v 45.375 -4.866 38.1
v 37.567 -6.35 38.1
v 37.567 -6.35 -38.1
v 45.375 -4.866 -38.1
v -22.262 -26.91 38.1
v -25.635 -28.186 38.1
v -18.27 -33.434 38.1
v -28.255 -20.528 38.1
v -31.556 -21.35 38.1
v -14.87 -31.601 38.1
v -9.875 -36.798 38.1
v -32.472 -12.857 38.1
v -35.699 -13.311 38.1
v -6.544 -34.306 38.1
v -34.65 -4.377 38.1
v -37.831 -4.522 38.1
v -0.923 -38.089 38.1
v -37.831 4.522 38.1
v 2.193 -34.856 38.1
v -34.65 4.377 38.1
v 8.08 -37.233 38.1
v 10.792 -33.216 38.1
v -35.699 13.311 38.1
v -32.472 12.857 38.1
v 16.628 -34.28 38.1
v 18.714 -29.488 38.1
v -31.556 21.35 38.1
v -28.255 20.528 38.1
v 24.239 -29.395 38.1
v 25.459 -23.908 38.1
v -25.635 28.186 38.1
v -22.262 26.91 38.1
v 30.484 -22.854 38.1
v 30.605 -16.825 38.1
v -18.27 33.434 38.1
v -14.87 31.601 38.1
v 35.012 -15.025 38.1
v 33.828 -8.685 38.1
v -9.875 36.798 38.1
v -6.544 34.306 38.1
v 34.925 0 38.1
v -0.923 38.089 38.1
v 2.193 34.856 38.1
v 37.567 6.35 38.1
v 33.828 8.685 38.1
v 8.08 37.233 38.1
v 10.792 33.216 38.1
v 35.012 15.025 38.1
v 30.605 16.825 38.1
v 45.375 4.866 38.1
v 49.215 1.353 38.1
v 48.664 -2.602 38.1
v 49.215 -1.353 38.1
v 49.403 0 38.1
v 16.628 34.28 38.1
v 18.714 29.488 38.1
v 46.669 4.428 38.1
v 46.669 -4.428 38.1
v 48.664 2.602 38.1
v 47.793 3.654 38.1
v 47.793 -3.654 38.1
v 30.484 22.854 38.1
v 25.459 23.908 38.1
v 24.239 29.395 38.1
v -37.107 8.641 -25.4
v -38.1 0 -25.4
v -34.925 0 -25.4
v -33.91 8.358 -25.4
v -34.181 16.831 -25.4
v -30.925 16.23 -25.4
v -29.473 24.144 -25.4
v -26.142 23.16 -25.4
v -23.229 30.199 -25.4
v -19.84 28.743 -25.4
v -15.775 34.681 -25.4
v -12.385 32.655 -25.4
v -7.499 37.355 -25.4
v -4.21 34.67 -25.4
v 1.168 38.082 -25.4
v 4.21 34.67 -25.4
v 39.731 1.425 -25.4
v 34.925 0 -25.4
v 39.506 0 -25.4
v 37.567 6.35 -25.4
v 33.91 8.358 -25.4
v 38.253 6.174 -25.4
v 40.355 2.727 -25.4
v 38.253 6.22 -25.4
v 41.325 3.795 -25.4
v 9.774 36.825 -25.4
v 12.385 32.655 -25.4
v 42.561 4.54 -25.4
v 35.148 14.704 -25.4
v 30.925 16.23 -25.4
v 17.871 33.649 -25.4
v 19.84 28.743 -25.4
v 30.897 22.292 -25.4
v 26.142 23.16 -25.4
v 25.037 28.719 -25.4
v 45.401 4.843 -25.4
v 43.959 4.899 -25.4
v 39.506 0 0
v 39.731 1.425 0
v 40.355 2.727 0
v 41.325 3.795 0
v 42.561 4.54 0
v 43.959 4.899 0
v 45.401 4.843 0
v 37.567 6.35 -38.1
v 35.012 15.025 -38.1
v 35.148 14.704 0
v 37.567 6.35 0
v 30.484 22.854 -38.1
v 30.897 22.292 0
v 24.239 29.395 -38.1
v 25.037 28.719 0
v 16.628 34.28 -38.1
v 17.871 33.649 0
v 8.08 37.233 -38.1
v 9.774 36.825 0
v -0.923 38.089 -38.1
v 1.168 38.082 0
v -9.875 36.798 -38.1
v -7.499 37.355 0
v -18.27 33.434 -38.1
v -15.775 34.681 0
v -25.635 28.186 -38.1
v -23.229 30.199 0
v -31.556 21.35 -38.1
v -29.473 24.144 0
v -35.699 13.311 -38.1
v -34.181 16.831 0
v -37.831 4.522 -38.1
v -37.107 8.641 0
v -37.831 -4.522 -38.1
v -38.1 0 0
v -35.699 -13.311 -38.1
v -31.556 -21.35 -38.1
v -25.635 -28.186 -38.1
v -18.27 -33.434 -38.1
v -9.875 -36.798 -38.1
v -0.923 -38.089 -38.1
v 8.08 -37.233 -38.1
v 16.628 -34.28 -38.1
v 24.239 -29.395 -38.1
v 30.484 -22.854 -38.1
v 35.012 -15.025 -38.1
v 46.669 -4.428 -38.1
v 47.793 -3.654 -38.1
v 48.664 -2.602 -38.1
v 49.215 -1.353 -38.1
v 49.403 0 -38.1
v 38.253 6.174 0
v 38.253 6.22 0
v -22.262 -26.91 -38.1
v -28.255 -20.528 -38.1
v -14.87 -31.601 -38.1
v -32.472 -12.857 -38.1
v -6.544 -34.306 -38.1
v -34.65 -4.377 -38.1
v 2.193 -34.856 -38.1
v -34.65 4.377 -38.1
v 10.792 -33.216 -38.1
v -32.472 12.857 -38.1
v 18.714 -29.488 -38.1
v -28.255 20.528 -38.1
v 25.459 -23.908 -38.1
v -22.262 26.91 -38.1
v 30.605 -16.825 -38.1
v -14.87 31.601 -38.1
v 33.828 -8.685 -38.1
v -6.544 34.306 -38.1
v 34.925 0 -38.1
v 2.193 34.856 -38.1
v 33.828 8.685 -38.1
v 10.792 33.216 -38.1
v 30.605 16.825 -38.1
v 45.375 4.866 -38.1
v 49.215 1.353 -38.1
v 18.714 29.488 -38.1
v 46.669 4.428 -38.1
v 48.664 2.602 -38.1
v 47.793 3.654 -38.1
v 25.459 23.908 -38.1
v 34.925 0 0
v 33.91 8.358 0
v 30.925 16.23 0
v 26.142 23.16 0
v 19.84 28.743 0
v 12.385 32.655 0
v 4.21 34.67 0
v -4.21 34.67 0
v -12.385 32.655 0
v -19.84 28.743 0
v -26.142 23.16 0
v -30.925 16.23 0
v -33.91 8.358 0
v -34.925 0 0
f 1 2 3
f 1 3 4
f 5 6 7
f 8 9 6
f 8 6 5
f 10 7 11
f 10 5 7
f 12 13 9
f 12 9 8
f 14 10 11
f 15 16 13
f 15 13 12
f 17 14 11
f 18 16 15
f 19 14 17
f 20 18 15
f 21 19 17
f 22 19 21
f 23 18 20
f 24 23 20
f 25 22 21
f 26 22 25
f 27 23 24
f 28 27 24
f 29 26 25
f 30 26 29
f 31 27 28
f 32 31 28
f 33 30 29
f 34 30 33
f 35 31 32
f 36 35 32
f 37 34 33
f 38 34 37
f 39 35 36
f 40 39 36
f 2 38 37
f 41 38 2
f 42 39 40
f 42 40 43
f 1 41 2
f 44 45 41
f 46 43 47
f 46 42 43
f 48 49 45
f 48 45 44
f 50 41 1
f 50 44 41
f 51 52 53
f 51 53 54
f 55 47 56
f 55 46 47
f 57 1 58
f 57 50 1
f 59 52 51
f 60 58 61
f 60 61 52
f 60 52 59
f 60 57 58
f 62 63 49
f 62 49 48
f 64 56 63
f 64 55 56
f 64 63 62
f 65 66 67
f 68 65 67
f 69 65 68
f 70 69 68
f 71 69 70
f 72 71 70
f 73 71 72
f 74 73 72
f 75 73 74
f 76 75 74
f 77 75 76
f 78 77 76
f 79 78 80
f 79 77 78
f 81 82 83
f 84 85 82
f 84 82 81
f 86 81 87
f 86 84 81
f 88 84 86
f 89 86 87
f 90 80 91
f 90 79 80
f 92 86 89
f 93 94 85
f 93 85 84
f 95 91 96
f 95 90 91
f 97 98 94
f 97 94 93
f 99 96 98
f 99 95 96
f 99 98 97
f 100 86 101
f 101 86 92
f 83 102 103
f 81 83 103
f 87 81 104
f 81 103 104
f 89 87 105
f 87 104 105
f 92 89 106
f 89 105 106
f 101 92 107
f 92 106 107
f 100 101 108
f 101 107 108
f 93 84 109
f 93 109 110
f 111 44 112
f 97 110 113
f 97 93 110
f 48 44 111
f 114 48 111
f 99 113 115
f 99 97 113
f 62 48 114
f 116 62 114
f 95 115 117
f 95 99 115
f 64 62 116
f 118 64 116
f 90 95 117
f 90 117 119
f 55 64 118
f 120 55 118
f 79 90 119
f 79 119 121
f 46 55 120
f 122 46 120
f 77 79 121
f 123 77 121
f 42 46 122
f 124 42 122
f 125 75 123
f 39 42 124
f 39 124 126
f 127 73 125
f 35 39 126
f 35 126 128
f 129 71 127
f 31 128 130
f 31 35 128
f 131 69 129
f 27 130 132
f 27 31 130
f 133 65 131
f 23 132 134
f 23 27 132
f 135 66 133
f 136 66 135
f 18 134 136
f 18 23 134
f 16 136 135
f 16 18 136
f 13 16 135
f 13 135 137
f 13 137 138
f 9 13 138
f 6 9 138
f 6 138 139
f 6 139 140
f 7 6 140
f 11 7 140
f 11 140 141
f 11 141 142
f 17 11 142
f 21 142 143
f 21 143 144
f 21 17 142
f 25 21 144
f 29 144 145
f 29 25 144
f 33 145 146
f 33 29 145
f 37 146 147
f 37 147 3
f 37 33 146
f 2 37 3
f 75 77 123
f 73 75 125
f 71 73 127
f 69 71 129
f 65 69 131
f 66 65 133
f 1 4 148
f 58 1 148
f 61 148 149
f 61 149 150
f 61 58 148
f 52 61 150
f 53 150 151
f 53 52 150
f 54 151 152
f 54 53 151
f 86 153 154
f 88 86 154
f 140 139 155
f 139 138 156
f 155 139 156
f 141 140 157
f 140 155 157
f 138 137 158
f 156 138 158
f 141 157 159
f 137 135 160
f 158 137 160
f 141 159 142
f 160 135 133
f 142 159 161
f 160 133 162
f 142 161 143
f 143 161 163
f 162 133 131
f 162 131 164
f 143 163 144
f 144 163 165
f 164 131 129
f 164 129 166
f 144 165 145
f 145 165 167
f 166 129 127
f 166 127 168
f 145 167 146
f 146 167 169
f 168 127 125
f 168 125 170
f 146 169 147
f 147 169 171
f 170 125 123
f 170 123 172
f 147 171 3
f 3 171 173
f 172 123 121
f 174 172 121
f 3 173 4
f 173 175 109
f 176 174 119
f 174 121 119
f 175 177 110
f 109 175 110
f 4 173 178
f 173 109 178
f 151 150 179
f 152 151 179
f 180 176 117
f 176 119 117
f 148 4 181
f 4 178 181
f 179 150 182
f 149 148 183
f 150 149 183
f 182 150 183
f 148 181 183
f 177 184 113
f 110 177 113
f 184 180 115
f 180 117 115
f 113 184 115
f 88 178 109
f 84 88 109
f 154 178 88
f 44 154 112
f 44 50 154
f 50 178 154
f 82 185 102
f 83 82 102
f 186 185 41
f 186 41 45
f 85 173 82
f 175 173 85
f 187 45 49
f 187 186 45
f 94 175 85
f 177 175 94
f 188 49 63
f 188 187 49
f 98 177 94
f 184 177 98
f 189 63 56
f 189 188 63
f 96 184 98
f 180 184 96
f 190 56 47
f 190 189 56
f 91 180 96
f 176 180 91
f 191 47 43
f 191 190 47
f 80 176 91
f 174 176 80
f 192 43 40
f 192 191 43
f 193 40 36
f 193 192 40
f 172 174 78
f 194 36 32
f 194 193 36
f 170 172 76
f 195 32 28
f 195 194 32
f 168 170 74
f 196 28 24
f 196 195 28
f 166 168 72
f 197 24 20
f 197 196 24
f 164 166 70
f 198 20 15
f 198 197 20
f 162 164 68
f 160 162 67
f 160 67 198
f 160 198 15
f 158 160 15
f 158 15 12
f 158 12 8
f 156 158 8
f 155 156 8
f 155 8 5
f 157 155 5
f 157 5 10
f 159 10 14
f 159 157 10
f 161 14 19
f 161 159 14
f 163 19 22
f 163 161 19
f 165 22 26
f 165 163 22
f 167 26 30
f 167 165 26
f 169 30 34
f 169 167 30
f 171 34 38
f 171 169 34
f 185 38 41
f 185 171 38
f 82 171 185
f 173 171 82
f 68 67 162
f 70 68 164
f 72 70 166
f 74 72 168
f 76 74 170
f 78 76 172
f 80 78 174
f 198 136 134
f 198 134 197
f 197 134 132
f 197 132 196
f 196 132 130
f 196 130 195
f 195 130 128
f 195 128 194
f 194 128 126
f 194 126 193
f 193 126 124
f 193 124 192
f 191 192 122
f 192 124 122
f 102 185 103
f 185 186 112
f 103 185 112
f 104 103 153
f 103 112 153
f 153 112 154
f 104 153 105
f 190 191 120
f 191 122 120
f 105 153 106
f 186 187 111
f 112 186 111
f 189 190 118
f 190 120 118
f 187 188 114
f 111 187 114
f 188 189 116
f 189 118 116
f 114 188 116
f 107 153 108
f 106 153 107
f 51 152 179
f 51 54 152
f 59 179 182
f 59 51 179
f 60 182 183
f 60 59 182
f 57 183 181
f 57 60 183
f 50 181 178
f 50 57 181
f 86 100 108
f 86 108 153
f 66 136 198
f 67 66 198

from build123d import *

# Parameters (mm, degrees)
F0_R     = 34.925
F1_DEPTH = 38.1
F2_DEPTH = 38.1
F4_DEPTH = 25.4


with BuildPart() as f1:
    # F0 (on Top) → F1 (new body, symmetric)
    with BuildSketch(Plane.XY):
        with BuildLine():
            ThreePointArc((37.567107, -6.35), (37.966543, -3.186161), (38.1, 0))
            ThreePointArc((38.1, 0), (37.966543, 3.186161), (37.567107, 6.35))
            ThreePointArc((37.567107, 6.35), (-38.1, 0), (37.567107, -6.35))
        make_face()
        Circle(F0_R, mode=Mode.SUBTRACT)
    extrude(amount=F1_DEPTH, both=True)

    # F0 (on Top) → F2 (join, symmetric)
    with BuildSketch(Plane.XY):
        with BuildLine():
            ThreePointArc((37.567107, 6.35), (37.966543, 3.186161), (38.1, 0))
            ThreePointArc((38.1, 0), (37.966543, -3.186161), (37.567107, -6.35))
            Line((37.567107, -6.35), (45.374916, -4.865875))
            ThreePointArc((45.374916, -4.865875), (39.497, 0), (45.374916, 4.865875))
            Line((45.374916, 4.865875), (37.567107, 6.35))
        make_face()
        with BuildLine():
            ThreePointArc((49.403, 0), (48.265319, 3.158409), (45.374916, 4.865875))
            ThreePointArc((45.374916, 4.865875), (39.497, 0), (45.374916, -4.865875))
            ThreePointArc((45.374916, -4.865875), (48.265319, -3.158409), (49.403, 0))
        make_face()
    extrude(amount=F2_DEPTH, both=True)

    # F3 (on Top) → F4 (cut)
    with BuildSketch(Plane.XY):
        with BuildLine():
            Line((-42.947944, 0), (39.505817, 0))
            ThreePointArc((39.505817, 0), (41.325165, 3.794629), (45.400634, 4.843333))
            Line((45.400634, 4.843333), (38.253166, 6.174064))
            Line((38.253166, 6.174064), (38.253166, 40.875405))
            Line((38.253166, 40.875405), (-42.947944, 40.875405))
            Line((-42.947944, 40.875405), (-42.947944, 0))
        make_face()
    extrude(amount=-F4_DEPTH, mode=Mode.SUBTRACT)


solid = f1.part
